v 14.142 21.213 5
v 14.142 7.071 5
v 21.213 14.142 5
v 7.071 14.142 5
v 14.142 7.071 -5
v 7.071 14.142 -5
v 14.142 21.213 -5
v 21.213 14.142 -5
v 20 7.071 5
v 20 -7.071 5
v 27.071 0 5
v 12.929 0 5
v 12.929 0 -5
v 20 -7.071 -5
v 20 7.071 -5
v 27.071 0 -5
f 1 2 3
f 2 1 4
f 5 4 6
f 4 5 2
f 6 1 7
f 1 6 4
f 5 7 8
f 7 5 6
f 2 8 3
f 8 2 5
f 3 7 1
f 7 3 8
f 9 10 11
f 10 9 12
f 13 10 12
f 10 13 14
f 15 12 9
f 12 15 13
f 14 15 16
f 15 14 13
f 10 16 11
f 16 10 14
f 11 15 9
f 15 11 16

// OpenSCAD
rotate( [ 0, 0, 45 ] )
{
    translate( [ 20, 0, 0 ] ) { cube( size = 10, center = true ); }
}

translate( [ 20, 0, 0 ] )
{
    rotate( [ 0, 0, 45 ] ) { cube( size = 10, center = true ); }
}
